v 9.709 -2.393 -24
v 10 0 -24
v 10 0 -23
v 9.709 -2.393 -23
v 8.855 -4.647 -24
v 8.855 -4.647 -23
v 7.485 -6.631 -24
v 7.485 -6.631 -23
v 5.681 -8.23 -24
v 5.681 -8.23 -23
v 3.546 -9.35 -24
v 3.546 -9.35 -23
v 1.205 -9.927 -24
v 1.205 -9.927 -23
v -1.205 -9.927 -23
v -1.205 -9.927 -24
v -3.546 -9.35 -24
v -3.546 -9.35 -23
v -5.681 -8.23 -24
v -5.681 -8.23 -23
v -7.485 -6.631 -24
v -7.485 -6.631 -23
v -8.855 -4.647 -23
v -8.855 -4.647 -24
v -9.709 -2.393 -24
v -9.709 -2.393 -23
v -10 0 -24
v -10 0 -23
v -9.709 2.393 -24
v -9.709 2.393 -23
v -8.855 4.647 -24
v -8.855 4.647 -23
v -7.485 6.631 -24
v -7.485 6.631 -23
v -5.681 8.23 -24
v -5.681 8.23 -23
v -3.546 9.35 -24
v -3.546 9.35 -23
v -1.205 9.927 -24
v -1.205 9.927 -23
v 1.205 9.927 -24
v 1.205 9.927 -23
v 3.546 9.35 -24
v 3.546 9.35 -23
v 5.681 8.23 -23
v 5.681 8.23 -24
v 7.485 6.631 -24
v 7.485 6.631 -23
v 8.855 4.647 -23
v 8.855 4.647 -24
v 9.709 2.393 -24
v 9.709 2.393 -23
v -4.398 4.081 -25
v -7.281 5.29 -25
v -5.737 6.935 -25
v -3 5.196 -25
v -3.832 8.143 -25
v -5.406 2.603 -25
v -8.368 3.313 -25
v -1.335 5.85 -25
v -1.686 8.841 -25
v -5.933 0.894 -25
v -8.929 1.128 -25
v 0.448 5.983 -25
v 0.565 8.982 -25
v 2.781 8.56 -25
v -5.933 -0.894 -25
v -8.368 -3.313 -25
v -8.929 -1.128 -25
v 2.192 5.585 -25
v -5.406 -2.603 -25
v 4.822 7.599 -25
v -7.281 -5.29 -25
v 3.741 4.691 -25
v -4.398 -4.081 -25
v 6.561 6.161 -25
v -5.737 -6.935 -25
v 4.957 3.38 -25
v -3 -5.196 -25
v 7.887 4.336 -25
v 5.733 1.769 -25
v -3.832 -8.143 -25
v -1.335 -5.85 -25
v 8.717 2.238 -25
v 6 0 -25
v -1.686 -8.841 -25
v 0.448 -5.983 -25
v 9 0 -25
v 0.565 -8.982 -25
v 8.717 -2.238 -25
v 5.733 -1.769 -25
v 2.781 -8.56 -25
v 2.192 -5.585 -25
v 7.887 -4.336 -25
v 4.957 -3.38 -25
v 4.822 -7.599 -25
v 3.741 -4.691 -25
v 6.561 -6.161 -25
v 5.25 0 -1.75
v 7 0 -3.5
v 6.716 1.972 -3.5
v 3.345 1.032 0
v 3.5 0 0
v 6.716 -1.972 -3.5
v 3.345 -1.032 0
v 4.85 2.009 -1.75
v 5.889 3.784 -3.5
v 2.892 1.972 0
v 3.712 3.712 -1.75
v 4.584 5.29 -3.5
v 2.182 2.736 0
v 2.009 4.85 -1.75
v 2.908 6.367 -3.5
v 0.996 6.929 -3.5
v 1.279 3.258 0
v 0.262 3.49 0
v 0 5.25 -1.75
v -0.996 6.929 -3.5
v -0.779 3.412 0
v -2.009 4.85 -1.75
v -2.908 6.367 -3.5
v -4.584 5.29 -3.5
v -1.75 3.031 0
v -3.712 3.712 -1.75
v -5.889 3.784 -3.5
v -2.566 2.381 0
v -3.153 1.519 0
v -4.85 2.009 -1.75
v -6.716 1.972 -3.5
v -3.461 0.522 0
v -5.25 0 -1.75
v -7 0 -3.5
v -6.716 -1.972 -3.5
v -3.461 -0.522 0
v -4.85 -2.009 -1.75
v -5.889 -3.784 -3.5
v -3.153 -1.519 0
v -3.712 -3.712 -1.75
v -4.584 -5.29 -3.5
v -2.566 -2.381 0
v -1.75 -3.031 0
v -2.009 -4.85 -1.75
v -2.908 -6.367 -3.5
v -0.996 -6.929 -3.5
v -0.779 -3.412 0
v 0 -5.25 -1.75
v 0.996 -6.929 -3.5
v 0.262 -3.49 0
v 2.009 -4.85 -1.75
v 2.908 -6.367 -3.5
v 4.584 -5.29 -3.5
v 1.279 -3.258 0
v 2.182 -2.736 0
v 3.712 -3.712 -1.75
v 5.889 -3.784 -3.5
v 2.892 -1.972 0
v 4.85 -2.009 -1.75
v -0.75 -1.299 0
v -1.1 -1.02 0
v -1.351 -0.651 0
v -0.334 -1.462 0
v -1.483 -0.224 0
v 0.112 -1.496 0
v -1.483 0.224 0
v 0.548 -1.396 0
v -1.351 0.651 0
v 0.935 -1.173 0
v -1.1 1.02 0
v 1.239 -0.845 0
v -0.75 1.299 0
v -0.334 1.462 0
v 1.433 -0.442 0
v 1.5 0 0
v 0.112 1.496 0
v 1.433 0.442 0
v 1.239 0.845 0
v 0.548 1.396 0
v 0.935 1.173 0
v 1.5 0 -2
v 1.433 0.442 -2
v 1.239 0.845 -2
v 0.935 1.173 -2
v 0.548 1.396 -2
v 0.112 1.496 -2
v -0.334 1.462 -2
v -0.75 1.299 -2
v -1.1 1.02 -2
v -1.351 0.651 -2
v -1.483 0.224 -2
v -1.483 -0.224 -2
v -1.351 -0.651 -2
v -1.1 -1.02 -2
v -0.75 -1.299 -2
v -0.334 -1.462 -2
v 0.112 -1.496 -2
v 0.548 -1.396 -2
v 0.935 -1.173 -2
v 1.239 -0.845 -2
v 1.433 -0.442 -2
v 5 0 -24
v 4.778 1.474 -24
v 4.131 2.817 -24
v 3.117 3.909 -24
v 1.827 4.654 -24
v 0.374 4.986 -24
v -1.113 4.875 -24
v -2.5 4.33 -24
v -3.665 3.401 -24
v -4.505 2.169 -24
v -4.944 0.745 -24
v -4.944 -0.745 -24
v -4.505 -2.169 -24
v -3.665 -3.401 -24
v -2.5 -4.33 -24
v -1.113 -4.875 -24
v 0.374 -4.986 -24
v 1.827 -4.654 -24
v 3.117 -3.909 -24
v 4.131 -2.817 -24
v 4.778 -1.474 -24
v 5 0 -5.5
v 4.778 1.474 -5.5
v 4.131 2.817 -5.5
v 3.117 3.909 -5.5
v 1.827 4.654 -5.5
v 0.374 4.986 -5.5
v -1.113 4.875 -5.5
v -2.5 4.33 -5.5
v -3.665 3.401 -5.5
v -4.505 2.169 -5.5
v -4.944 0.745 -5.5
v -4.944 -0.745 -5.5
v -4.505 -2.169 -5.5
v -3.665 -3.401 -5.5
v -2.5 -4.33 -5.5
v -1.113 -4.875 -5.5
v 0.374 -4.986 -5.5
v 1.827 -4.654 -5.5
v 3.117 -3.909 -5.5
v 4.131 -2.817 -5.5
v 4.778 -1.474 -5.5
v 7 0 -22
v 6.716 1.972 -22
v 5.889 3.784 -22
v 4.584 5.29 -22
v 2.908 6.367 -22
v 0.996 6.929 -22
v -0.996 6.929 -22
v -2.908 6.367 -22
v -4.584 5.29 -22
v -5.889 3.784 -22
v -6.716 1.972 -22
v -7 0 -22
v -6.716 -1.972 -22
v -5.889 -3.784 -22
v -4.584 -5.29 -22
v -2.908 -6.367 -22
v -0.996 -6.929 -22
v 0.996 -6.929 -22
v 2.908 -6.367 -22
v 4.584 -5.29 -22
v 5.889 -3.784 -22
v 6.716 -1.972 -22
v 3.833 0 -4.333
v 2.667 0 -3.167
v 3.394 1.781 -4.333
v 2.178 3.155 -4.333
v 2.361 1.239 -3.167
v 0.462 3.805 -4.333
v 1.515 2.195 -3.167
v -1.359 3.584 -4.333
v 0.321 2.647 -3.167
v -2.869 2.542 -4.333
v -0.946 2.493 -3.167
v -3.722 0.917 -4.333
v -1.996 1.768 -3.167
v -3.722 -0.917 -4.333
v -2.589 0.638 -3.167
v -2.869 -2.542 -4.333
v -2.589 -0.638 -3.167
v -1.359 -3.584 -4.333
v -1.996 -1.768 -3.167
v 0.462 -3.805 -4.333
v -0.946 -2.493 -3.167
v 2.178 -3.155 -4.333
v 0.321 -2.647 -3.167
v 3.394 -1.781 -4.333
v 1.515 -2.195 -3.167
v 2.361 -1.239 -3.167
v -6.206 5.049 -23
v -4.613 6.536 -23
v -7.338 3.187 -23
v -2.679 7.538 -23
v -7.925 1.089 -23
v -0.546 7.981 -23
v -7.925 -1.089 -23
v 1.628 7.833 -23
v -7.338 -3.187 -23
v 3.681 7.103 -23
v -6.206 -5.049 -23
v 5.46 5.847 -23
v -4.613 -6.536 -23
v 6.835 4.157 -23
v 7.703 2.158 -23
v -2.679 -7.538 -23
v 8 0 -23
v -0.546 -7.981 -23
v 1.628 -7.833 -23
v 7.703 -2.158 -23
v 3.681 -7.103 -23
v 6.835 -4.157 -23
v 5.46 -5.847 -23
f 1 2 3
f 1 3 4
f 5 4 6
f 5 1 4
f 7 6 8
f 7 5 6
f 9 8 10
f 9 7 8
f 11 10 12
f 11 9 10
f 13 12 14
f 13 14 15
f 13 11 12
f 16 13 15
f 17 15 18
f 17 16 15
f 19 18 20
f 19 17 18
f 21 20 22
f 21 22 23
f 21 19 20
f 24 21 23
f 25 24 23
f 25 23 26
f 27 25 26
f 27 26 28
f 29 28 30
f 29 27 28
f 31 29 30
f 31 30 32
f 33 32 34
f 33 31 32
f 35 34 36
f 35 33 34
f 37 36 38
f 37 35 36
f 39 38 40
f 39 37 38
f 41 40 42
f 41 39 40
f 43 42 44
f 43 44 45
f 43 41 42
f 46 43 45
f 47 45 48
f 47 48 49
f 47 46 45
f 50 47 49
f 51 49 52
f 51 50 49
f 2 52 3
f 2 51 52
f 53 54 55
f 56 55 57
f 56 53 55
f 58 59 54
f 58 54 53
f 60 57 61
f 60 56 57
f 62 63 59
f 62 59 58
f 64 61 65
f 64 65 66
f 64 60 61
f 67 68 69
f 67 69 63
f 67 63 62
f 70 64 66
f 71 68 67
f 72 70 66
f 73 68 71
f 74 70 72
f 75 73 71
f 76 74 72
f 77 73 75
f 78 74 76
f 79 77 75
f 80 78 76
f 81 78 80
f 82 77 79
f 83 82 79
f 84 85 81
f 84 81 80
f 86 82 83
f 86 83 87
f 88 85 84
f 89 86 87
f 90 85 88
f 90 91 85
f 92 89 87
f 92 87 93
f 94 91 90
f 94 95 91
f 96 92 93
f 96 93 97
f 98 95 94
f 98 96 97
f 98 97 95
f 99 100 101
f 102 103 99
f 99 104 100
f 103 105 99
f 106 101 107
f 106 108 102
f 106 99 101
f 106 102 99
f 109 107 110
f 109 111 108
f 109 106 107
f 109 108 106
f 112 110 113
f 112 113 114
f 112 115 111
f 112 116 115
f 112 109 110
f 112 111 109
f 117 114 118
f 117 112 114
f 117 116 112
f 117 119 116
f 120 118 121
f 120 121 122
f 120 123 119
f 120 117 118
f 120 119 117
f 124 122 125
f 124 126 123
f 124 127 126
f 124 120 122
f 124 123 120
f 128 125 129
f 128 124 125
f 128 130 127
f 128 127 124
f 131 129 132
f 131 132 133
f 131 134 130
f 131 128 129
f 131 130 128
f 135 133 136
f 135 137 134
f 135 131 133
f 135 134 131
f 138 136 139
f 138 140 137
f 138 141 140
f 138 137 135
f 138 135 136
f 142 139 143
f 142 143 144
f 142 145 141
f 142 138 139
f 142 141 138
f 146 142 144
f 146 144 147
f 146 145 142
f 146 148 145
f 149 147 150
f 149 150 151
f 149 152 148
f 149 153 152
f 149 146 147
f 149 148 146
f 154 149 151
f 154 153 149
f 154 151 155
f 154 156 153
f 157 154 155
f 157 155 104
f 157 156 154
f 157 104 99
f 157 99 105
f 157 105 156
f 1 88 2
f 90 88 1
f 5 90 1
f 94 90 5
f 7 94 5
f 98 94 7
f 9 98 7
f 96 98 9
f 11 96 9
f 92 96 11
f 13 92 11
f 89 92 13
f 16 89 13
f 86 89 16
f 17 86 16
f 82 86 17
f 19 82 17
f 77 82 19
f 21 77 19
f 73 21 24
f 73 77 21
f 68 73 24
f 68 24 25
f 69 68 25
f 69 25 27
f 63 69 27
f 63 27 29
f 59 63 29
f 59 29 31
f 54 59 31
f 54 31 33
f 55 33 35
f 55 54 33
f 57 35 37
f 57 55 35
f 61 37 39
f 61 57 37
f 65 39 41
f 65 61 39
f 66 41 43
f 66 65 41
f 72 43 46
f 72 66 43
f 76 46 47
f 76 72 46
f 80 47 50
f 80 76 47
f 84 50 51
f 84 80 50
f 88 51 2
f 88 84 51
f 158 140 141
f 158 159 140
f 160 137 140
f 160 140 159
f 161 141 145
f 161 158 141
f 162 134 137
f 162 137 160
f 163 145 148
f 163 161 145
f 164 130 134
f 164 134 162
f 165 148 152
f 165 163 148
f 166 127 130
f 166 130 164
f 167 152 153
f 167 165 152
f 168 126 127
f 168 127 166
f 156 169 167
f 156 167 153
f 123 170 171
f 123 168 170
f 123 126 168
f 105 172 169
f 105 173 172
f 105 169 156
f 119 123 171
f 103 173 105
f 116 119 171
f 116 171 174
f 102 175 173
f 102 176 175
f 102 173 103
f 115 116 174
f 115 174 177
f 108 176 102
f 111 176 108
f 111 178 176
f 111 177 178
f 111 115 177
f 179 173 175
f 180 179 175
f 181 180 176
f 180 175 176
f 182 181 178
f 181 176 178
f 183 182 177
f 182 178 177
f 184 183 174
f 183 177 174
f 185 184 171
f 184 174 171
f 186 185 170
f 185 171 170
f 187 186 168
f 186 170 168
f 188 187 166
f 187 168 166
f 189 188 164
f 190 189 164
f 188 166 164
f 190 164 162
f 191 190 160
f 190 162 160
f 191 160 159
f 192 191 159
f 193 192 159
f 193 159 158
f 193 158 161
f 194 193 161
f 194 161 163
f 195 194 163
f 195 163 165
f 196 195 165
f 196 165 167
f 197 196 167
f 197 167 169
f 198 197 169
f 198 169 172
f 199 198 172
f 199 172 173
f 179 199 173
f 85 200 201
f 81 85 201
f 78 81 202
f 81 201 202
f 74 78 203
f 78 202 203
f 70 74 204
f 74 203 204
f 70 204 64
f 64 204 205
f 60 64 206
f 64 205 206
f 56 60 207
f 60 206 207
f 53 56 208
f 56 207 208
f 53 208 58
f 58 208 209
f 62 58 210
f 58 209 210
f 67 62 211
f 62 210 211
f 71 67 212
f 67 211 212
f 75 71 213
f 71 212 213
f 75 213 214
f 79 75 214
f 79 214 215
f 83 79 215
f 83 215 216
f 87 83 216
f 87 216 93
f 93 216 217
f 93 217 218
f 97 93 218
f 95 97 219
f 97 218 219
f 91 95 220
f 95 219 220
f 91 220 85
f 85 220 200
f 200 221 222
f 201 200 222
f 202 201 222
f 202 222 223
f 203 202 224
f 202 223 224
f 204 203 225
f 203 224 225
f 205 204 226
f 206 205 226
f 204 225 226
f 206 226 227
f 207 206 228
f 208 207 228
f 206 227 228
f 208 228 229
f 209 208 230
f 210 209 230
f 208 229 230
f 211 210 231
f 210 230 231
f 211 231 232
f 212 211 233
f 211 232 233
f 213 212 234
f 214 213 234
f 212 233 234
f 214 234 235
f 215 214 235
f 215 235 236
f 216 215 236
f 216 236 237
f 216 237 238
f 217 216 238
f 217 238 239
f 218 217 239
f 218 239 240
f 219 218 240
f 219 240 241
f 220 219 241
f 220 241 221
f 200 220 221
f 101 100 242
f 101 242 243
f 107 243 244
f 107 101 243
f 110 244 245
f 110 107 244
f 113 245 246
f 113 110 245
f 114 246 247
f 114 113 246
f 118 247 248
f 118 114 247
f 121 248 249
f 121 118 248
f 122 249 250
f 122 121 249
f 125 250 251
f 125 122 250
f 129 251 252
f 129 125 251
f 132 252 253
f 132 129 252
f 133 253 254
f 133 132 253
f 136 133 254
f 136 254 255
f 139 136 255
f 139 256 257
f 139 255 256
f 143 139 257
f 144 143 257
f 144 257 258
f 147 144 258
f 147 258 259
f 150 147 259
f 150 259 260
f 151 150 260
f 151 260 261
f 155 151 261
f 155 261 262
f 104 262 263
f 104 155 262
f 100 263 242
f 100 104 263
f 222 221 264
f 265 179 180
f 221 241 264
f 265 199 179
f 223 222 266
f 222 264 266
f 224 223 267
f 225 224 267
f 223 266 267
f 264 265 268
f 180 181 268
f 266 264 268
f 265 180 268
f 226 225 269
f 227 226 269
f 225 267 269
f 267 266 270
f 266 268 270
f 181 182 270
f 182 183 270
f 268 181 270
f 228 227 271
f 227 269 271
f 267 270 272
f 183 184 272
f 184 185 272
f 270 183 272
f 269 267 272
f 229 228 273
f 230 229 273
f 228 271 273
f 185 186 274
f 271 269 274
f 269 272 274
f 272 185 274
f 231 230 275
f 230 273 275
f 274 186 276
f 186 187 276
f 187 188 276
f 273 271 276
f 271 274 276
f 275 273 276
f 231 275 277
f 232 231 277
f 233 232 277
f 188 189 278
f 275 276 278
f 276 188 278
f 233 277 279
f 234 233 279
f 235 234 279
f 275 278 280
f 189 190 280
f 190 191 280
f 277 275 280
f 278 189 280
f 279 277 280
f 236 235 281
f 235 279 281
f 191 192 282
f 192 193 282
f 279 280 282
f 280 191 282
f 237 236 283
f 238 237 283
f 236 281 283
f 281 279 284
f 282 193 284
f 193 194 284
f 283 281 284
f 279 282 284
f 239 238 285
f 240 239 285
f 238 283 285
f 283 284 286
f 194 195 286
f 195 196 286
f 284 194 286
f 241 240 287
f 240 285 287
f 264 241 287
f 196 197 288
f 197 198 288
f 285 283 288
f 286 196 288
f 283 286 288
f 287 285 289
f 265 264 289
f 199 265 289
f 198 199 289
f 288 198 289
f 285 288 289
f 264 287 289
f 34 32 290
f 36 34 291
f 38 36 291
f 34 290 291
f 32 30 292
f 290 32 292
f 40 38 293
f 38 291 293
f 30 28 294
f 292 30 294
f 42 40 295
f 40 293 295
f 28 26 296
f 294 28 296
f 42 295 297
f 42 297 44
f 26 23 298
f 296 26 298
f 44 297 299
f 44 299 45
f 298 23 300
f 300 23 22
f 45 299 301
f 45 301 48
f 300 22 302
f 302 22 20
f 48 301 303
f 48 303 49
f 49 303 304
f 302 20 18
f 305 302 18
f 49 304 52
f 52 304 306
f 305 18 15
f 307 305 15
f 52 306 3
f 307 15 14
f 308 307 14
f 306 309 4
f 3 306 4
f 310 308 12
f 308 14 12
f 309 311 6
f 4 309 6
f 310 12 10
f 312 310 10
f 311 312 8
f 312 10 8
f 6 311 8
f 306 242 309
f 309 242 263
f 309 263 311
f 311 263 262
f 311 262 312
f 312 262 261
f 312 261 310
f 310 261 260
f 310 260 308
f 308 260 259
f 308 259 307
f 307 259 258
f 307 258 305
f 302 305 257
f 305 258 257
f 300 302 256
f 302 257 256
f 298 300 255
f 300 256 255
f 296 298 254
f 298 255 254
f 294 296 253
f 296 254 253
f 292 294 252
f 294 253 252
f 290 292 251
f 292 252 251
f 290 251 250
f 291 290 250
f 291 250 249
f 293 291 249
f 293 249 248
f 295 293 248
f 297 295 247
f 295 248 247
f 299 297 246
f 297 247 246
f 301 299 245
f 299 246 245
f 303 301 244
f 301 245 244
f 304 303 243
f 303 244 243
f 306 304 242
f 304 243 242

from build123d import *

# Parameters (mm, degrees)
F0_R     = 7
F0_R_2   = 1.5
F1_DEPTH = 25
F2_T     = -2
F3_DEPTH = 25
F4_R     = 10
F4_R_2   = 7
F5_DEPTH = 2
F6_SIZE  = 1
F7_SIZE  = 3.49999


# Not quite as in the source:
# - a fillet or chamfer is up to 0.001 mm smaller than in the source, because OpenCascade refuses the exact size


with BuildPart() as f1:
    # F0 (on Top) → F1 (new body)
    with BuildSketch(Plane.XY):
        Circle(F0_R)
        Circle(F0_R_2, mode=Mode.SUBTRACT)
        Circle(F0_R_2)
    extrude(amount=-F1_DEPTH)

    # F2
    f2_openings = [f1.faces().sort_by_distance(p)[0] for p in [
        (0, 0, -25),
    ]]
    offset(amount=F2_T, openings=f2_openings)

    # F0 (on Top) → F3 (cut)
    with BuildSketch(Plane.XY):
        Circle(F0_R_2)
    extrude(amount=-F3_DEPTH, mode=Mode.SUBTRACT)

    # F4 (on face) → F5 (join)
    with BuildSketch(Plane(origin=(0, 0, -25), x_dir=(1, 0, 0), z_dir=(0, 0, -1))):
        Circle(F4_R)
        Circle(F4_R_2, mode=Mode.SUBTRACT)
    extrude(amount=-F5_DEPTH)

    # F6
    f6_edges = [f1.edges().sort_by_distance(p)[0] for p in [
        (-7, 0, -23),
        (-5, 0, -25),
        (-10, 0, -25),
    ]]
    chamfer(f6_edges, length=F6_SIZE)

    # F7 (size 3.5 in the source; OpenCascade refuses exactly that, so slightly less here)
    f7_edges = [f1.edges().sort_by_distance(p)[0] for p in [
        (-7, 0, 0),
        (-5, 0, -2),
    ]]
    chamfer(f7_edges, length=F7_SIZE)


solid = f1.part
